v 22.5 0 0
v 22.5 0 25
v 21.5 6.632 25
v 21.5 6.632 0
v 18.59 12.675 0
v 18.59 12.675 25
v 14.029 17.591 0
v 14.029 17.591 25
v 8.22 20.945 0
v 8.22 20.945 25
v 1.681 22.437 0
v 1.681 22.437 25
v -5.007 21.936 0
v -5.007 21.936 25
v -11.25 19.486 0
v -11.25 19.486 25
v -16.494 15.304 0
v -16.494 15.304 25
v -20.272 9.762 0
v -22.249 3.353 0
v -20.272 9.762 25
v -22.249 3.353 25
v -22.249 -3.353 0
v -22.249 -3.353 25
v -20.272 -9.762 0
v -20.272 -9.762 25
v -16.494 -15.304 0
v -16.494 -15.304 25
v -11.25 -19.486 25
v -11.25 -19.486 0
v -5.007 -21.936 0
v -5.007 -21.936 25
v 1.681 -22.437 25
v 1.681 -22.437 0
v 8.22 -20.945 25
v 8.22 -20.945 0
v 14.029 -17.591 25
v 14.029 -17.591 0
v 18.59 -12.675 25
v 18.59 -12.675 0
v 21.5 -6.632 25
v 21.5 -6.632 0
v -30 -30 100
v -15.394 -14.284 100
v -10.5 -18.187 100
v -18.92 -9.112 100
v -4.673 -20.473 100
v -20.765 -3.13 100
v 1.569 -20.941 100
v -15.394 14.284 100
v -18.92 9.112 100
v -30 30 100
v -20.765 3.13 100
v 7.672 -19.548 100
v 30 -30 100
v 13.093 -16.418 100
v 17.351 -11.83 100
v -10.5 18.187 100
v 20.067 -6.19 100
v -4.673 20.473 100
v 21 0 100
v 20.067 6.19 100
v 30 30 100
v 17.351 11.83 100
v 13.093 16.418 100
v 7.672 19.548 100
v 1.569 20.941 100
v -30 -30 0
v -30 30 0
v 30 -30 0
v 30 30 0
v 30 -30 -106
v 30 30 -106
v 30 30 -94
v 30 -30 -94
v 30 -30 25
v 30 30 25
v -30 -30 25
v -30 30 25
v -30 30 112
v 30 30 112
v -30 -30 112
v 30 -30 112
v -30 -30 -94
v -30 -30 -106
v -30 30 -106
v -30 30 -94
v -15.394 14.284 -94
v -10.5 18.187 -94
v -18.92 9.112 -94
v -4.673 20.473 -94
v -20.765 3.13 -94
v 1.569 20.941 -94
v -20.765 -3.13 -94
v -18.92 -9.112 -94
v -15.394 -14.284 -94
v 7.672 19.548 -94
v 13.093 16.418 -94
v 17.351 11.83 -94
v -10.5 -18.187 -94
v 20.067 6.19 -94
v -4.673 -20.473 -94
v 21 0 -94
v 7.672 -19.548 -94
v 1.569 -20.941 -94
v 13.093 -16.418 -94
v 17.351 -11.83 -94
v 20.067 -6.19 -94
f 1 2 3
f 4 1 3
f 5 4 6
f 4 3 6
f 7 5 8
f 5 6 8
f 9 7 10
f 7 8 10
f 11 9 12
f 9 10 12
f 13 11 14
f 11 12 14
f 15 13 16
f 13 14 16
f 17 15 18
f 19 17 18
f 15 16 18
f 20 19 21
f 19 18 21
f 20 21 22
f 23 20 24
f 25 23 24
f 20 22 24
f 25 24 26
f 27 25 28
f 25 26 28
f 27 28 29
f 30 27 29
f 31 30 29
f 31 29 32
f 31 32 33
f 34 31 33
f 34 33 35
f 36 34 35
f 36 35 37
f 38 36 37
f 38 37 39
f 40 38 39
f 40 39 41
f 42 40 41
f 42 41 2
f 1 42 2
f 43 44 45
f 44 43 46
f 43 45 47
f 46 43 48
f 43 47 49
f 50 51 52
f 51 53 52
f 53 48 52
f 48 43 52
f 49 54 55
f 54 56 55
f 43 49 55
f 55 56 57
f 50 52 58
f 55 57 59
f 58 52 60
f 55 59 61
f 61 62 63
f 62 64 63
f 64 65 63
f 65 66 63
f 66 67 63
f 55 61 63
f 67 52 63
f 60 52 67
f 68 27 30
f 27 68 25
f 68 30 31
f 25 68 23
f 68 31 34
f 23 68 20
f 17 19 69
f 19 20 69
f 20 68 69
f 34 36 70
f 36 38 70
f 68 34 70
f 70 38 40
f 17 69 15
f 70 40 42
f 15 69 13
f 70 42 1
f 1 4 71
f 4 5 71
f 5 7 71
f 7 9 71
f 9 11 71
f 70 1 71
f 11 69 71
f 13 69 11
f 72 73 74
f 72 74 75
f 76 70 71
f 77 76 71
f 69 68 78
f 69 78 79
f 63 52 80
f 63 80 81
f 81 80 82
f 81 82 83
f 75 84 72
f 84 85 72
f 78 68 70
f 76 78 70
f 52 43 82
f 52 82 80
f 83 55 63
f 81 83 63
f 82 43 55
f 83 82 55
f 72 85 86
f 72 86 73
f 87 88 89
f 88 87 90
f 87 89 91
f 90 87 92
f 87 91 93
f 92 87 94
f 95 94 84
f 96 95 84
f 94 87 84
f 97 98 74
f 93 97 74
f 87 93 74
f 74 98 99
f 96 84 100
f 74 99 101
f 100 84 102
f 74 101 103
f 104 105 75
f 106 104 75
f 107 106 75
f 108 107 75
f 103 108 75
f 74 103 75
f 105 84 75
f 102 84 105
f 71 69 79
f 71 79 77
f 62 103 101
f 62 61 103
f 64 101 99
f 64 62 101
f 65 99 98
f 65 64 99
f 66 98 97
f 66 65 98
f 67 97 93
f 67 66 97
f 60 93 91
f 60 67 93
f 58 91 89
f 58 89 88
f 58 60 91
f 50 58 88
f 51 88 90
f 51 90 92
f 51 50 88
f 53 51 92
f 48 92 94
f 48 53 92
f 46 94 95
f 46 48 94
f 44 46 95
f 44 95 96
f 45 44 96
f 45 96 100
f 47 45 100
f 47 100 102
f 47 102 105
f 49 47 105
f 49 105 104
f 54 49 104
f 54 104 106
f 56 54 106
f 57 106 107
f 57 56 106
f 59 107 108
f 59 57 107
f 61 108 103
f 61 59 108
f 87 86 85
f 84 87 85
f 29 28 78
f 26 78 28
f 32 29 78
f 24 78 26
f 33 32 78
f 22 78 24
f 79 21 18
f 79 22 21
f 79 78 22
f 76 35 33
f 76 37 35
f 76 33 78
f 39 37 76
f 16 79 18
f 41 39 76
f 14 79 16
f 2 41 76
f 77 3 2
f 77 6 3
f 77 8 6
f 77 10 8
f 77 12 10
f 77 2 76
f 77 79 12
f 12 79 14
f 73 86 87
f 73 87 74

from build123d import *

# Parameters (mm, degrees)
F0_W     = 60
F0_H     = 60
F1_DEPTH = 25
F2_R     = 22.5
F3_DEPTH = 25.001
F4_R     = 21
F5_DEPTH = 100
F7_W     = 60
F7_H     = 60
F7_R     = 21
F8_DEPTH = 6
F6_W     = 60
F6_H     = 60
F9_DEPTH = 12


with BuildPart() as f1:
    # F0 (on Top) → F1 (new body)
    with BuildSketch(Plane.XY):
        Rectangle(F0_W, F0_H)
    extrude(amount=F1_DEPTH)

    # F2 (on face) → F3 (cut, through all)
    with BuildSketch(Plane.XY.offset(25)):
        Circle(F2_R)
    extrude(amount=-F3_DEPTH, mode=Mode.SUBTRACT)


with BuildPart() as f5:
    # F4 (on Top) → F5 (new body, symmetric)
    with BuildSketch(Plane.XY):
        Circle(F4_R)
    extrude(amount=F5_DEPTH, both=True)

    # F7 (on face) → F8 (join, symmetric)
    with BuildSketch(Plane(origin=(0, 0, -100), x_dir=(1, 0, 0), z_dir=(0, 0, -1))):
        Rectangle(F7_W, F7_H)
        Circle(F7_R, mode=Mode.SUBTRACT)
        Circle(F7_R)
    extrude(amount=F8_DEPTH, both=True)

    # F6 (on face) → F9 (join)
    with BuildSketch(Plane.XY.offset(100)):
        Rectangle(F6_W, F6_H)
    extrude(amount=F9_DEPTH)


solid = Compound([f1.part, f5.part])
